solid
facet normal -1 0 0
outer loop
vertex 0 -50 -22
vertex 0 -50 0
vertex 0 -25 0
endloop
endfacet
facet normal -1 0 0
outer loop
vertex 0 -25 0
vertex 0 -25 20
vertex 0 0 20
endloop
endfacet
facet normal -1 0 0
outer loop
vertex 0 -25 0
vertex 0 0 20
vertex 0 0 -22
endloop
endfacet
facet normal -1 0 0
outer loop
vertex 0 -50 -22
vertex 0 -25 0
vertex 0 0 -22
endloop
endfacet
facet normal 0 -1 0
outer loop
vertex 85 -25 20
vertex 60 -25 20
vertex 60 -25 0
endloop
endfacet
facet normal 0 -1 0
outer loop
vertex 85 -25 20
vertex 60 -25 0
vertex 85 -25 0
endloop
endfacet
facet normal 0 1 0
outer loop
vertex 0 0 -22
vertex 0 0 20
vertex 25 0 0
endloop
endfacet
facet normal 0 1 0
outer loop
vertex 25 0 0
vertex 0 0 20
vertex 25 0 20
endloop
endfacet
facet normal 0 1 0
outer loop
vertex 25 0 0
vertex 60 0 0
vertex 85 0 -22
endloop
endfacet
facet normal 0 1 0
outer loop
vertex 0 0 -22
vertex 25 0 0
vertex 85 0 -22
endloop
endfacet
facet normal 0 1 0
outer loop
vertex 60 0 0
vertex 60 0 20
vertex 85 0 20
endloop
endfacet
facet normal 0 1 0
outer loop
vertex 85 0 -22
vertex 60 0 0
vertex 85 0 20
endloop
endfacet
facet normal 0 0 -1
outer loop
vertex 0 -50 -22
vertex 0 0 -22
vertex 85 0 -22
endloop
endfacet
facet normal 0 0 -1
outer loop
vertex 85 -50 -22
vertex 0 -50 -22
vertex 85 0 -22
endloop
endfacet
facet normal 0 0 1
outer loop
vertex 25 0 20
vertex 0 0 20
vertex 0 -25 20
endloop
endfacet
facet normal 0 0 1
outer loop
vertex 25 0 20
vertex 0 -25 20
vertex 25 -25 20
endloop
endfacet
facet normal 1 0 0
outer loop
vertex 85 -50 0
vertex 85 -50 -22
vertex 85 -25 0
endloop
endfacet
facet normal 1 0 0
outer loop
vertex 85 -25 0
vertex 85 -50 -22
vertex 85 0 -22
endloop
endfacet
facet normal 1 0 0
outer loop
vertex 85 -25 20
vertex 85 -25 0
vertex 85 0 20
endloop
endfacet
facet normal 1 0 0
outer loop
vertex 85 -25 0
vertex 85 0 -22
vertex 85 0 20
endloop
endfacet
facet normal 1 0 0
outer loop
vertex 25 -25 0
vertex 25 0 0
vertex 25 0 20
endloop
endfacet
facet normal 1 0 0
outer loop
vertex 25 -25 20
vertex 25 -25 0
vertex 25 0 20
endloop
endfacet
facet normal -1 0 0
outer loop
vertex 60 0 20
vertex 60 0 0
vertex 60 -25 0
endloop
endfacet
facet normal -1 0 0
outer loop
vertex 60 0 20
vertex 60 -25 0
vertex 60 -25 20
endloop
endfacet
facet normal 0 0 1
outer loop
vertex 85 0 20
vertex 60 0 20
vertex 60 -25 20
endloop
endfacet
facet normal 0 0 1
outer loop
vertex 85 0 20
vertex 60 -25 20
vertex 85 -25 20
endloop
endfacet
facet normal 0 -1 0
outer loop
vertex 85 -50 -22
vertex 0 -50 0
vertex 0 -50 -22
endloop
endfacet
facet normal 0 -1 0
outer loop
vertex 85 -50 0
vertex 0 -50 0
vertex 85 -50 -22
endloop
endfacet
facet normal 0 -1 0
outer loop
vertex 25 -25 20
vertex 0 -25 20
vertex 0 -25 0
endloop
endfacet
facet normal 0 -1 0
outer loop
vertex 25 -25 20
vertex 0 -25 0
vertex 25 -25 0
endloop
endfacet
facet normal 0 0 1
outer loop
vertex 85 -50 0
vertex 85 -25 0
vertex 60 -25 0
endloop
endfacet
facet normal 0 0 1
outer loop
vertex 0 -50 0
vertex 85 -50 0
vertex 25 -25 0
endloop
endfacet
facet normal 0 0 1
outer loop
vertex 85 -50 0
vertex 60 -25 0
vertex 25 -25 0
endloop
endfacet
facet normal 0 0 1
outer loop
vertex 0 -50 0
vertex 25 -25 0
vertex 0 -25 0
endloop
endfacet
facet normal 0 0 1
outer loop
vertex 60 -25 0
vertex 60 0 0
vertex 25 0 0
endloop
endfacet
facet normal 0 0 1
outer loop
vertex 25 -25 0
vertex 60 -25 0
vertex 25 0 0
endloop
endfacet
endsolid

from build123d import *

# Parameters (mm, degrees)
F1_DEPTH = 50
F0_W     = 25
F0_H     = 20
F2_DEPTH = 25


with BuildPart() as f1:
    # F0 (on Front) → F1 (new body)
    with BuildSketch(Plane.XZ):
        Polygon((25, 0), (0, 0), (0, -22), (85, -22), (85, 0), (60, 0), align=None)
    extrude(amount=F1_DEPTH)

    # F0 (on Front) → F2 (join)
    with BuildSketch(Plane.XZ):
        with Locations((12.5, 10)):
            Rectangle(F0_W, F0_H)
        Polygon((25, 0), (0, 0), (0, -22), (85, -22), (85, 0), (60, 0), align=None)
        with Locations((72.5, 10)):
            Rectangle(F0_W, F0_H)
    extrude(amount=F2_DEPTH)


solid = f1.part
